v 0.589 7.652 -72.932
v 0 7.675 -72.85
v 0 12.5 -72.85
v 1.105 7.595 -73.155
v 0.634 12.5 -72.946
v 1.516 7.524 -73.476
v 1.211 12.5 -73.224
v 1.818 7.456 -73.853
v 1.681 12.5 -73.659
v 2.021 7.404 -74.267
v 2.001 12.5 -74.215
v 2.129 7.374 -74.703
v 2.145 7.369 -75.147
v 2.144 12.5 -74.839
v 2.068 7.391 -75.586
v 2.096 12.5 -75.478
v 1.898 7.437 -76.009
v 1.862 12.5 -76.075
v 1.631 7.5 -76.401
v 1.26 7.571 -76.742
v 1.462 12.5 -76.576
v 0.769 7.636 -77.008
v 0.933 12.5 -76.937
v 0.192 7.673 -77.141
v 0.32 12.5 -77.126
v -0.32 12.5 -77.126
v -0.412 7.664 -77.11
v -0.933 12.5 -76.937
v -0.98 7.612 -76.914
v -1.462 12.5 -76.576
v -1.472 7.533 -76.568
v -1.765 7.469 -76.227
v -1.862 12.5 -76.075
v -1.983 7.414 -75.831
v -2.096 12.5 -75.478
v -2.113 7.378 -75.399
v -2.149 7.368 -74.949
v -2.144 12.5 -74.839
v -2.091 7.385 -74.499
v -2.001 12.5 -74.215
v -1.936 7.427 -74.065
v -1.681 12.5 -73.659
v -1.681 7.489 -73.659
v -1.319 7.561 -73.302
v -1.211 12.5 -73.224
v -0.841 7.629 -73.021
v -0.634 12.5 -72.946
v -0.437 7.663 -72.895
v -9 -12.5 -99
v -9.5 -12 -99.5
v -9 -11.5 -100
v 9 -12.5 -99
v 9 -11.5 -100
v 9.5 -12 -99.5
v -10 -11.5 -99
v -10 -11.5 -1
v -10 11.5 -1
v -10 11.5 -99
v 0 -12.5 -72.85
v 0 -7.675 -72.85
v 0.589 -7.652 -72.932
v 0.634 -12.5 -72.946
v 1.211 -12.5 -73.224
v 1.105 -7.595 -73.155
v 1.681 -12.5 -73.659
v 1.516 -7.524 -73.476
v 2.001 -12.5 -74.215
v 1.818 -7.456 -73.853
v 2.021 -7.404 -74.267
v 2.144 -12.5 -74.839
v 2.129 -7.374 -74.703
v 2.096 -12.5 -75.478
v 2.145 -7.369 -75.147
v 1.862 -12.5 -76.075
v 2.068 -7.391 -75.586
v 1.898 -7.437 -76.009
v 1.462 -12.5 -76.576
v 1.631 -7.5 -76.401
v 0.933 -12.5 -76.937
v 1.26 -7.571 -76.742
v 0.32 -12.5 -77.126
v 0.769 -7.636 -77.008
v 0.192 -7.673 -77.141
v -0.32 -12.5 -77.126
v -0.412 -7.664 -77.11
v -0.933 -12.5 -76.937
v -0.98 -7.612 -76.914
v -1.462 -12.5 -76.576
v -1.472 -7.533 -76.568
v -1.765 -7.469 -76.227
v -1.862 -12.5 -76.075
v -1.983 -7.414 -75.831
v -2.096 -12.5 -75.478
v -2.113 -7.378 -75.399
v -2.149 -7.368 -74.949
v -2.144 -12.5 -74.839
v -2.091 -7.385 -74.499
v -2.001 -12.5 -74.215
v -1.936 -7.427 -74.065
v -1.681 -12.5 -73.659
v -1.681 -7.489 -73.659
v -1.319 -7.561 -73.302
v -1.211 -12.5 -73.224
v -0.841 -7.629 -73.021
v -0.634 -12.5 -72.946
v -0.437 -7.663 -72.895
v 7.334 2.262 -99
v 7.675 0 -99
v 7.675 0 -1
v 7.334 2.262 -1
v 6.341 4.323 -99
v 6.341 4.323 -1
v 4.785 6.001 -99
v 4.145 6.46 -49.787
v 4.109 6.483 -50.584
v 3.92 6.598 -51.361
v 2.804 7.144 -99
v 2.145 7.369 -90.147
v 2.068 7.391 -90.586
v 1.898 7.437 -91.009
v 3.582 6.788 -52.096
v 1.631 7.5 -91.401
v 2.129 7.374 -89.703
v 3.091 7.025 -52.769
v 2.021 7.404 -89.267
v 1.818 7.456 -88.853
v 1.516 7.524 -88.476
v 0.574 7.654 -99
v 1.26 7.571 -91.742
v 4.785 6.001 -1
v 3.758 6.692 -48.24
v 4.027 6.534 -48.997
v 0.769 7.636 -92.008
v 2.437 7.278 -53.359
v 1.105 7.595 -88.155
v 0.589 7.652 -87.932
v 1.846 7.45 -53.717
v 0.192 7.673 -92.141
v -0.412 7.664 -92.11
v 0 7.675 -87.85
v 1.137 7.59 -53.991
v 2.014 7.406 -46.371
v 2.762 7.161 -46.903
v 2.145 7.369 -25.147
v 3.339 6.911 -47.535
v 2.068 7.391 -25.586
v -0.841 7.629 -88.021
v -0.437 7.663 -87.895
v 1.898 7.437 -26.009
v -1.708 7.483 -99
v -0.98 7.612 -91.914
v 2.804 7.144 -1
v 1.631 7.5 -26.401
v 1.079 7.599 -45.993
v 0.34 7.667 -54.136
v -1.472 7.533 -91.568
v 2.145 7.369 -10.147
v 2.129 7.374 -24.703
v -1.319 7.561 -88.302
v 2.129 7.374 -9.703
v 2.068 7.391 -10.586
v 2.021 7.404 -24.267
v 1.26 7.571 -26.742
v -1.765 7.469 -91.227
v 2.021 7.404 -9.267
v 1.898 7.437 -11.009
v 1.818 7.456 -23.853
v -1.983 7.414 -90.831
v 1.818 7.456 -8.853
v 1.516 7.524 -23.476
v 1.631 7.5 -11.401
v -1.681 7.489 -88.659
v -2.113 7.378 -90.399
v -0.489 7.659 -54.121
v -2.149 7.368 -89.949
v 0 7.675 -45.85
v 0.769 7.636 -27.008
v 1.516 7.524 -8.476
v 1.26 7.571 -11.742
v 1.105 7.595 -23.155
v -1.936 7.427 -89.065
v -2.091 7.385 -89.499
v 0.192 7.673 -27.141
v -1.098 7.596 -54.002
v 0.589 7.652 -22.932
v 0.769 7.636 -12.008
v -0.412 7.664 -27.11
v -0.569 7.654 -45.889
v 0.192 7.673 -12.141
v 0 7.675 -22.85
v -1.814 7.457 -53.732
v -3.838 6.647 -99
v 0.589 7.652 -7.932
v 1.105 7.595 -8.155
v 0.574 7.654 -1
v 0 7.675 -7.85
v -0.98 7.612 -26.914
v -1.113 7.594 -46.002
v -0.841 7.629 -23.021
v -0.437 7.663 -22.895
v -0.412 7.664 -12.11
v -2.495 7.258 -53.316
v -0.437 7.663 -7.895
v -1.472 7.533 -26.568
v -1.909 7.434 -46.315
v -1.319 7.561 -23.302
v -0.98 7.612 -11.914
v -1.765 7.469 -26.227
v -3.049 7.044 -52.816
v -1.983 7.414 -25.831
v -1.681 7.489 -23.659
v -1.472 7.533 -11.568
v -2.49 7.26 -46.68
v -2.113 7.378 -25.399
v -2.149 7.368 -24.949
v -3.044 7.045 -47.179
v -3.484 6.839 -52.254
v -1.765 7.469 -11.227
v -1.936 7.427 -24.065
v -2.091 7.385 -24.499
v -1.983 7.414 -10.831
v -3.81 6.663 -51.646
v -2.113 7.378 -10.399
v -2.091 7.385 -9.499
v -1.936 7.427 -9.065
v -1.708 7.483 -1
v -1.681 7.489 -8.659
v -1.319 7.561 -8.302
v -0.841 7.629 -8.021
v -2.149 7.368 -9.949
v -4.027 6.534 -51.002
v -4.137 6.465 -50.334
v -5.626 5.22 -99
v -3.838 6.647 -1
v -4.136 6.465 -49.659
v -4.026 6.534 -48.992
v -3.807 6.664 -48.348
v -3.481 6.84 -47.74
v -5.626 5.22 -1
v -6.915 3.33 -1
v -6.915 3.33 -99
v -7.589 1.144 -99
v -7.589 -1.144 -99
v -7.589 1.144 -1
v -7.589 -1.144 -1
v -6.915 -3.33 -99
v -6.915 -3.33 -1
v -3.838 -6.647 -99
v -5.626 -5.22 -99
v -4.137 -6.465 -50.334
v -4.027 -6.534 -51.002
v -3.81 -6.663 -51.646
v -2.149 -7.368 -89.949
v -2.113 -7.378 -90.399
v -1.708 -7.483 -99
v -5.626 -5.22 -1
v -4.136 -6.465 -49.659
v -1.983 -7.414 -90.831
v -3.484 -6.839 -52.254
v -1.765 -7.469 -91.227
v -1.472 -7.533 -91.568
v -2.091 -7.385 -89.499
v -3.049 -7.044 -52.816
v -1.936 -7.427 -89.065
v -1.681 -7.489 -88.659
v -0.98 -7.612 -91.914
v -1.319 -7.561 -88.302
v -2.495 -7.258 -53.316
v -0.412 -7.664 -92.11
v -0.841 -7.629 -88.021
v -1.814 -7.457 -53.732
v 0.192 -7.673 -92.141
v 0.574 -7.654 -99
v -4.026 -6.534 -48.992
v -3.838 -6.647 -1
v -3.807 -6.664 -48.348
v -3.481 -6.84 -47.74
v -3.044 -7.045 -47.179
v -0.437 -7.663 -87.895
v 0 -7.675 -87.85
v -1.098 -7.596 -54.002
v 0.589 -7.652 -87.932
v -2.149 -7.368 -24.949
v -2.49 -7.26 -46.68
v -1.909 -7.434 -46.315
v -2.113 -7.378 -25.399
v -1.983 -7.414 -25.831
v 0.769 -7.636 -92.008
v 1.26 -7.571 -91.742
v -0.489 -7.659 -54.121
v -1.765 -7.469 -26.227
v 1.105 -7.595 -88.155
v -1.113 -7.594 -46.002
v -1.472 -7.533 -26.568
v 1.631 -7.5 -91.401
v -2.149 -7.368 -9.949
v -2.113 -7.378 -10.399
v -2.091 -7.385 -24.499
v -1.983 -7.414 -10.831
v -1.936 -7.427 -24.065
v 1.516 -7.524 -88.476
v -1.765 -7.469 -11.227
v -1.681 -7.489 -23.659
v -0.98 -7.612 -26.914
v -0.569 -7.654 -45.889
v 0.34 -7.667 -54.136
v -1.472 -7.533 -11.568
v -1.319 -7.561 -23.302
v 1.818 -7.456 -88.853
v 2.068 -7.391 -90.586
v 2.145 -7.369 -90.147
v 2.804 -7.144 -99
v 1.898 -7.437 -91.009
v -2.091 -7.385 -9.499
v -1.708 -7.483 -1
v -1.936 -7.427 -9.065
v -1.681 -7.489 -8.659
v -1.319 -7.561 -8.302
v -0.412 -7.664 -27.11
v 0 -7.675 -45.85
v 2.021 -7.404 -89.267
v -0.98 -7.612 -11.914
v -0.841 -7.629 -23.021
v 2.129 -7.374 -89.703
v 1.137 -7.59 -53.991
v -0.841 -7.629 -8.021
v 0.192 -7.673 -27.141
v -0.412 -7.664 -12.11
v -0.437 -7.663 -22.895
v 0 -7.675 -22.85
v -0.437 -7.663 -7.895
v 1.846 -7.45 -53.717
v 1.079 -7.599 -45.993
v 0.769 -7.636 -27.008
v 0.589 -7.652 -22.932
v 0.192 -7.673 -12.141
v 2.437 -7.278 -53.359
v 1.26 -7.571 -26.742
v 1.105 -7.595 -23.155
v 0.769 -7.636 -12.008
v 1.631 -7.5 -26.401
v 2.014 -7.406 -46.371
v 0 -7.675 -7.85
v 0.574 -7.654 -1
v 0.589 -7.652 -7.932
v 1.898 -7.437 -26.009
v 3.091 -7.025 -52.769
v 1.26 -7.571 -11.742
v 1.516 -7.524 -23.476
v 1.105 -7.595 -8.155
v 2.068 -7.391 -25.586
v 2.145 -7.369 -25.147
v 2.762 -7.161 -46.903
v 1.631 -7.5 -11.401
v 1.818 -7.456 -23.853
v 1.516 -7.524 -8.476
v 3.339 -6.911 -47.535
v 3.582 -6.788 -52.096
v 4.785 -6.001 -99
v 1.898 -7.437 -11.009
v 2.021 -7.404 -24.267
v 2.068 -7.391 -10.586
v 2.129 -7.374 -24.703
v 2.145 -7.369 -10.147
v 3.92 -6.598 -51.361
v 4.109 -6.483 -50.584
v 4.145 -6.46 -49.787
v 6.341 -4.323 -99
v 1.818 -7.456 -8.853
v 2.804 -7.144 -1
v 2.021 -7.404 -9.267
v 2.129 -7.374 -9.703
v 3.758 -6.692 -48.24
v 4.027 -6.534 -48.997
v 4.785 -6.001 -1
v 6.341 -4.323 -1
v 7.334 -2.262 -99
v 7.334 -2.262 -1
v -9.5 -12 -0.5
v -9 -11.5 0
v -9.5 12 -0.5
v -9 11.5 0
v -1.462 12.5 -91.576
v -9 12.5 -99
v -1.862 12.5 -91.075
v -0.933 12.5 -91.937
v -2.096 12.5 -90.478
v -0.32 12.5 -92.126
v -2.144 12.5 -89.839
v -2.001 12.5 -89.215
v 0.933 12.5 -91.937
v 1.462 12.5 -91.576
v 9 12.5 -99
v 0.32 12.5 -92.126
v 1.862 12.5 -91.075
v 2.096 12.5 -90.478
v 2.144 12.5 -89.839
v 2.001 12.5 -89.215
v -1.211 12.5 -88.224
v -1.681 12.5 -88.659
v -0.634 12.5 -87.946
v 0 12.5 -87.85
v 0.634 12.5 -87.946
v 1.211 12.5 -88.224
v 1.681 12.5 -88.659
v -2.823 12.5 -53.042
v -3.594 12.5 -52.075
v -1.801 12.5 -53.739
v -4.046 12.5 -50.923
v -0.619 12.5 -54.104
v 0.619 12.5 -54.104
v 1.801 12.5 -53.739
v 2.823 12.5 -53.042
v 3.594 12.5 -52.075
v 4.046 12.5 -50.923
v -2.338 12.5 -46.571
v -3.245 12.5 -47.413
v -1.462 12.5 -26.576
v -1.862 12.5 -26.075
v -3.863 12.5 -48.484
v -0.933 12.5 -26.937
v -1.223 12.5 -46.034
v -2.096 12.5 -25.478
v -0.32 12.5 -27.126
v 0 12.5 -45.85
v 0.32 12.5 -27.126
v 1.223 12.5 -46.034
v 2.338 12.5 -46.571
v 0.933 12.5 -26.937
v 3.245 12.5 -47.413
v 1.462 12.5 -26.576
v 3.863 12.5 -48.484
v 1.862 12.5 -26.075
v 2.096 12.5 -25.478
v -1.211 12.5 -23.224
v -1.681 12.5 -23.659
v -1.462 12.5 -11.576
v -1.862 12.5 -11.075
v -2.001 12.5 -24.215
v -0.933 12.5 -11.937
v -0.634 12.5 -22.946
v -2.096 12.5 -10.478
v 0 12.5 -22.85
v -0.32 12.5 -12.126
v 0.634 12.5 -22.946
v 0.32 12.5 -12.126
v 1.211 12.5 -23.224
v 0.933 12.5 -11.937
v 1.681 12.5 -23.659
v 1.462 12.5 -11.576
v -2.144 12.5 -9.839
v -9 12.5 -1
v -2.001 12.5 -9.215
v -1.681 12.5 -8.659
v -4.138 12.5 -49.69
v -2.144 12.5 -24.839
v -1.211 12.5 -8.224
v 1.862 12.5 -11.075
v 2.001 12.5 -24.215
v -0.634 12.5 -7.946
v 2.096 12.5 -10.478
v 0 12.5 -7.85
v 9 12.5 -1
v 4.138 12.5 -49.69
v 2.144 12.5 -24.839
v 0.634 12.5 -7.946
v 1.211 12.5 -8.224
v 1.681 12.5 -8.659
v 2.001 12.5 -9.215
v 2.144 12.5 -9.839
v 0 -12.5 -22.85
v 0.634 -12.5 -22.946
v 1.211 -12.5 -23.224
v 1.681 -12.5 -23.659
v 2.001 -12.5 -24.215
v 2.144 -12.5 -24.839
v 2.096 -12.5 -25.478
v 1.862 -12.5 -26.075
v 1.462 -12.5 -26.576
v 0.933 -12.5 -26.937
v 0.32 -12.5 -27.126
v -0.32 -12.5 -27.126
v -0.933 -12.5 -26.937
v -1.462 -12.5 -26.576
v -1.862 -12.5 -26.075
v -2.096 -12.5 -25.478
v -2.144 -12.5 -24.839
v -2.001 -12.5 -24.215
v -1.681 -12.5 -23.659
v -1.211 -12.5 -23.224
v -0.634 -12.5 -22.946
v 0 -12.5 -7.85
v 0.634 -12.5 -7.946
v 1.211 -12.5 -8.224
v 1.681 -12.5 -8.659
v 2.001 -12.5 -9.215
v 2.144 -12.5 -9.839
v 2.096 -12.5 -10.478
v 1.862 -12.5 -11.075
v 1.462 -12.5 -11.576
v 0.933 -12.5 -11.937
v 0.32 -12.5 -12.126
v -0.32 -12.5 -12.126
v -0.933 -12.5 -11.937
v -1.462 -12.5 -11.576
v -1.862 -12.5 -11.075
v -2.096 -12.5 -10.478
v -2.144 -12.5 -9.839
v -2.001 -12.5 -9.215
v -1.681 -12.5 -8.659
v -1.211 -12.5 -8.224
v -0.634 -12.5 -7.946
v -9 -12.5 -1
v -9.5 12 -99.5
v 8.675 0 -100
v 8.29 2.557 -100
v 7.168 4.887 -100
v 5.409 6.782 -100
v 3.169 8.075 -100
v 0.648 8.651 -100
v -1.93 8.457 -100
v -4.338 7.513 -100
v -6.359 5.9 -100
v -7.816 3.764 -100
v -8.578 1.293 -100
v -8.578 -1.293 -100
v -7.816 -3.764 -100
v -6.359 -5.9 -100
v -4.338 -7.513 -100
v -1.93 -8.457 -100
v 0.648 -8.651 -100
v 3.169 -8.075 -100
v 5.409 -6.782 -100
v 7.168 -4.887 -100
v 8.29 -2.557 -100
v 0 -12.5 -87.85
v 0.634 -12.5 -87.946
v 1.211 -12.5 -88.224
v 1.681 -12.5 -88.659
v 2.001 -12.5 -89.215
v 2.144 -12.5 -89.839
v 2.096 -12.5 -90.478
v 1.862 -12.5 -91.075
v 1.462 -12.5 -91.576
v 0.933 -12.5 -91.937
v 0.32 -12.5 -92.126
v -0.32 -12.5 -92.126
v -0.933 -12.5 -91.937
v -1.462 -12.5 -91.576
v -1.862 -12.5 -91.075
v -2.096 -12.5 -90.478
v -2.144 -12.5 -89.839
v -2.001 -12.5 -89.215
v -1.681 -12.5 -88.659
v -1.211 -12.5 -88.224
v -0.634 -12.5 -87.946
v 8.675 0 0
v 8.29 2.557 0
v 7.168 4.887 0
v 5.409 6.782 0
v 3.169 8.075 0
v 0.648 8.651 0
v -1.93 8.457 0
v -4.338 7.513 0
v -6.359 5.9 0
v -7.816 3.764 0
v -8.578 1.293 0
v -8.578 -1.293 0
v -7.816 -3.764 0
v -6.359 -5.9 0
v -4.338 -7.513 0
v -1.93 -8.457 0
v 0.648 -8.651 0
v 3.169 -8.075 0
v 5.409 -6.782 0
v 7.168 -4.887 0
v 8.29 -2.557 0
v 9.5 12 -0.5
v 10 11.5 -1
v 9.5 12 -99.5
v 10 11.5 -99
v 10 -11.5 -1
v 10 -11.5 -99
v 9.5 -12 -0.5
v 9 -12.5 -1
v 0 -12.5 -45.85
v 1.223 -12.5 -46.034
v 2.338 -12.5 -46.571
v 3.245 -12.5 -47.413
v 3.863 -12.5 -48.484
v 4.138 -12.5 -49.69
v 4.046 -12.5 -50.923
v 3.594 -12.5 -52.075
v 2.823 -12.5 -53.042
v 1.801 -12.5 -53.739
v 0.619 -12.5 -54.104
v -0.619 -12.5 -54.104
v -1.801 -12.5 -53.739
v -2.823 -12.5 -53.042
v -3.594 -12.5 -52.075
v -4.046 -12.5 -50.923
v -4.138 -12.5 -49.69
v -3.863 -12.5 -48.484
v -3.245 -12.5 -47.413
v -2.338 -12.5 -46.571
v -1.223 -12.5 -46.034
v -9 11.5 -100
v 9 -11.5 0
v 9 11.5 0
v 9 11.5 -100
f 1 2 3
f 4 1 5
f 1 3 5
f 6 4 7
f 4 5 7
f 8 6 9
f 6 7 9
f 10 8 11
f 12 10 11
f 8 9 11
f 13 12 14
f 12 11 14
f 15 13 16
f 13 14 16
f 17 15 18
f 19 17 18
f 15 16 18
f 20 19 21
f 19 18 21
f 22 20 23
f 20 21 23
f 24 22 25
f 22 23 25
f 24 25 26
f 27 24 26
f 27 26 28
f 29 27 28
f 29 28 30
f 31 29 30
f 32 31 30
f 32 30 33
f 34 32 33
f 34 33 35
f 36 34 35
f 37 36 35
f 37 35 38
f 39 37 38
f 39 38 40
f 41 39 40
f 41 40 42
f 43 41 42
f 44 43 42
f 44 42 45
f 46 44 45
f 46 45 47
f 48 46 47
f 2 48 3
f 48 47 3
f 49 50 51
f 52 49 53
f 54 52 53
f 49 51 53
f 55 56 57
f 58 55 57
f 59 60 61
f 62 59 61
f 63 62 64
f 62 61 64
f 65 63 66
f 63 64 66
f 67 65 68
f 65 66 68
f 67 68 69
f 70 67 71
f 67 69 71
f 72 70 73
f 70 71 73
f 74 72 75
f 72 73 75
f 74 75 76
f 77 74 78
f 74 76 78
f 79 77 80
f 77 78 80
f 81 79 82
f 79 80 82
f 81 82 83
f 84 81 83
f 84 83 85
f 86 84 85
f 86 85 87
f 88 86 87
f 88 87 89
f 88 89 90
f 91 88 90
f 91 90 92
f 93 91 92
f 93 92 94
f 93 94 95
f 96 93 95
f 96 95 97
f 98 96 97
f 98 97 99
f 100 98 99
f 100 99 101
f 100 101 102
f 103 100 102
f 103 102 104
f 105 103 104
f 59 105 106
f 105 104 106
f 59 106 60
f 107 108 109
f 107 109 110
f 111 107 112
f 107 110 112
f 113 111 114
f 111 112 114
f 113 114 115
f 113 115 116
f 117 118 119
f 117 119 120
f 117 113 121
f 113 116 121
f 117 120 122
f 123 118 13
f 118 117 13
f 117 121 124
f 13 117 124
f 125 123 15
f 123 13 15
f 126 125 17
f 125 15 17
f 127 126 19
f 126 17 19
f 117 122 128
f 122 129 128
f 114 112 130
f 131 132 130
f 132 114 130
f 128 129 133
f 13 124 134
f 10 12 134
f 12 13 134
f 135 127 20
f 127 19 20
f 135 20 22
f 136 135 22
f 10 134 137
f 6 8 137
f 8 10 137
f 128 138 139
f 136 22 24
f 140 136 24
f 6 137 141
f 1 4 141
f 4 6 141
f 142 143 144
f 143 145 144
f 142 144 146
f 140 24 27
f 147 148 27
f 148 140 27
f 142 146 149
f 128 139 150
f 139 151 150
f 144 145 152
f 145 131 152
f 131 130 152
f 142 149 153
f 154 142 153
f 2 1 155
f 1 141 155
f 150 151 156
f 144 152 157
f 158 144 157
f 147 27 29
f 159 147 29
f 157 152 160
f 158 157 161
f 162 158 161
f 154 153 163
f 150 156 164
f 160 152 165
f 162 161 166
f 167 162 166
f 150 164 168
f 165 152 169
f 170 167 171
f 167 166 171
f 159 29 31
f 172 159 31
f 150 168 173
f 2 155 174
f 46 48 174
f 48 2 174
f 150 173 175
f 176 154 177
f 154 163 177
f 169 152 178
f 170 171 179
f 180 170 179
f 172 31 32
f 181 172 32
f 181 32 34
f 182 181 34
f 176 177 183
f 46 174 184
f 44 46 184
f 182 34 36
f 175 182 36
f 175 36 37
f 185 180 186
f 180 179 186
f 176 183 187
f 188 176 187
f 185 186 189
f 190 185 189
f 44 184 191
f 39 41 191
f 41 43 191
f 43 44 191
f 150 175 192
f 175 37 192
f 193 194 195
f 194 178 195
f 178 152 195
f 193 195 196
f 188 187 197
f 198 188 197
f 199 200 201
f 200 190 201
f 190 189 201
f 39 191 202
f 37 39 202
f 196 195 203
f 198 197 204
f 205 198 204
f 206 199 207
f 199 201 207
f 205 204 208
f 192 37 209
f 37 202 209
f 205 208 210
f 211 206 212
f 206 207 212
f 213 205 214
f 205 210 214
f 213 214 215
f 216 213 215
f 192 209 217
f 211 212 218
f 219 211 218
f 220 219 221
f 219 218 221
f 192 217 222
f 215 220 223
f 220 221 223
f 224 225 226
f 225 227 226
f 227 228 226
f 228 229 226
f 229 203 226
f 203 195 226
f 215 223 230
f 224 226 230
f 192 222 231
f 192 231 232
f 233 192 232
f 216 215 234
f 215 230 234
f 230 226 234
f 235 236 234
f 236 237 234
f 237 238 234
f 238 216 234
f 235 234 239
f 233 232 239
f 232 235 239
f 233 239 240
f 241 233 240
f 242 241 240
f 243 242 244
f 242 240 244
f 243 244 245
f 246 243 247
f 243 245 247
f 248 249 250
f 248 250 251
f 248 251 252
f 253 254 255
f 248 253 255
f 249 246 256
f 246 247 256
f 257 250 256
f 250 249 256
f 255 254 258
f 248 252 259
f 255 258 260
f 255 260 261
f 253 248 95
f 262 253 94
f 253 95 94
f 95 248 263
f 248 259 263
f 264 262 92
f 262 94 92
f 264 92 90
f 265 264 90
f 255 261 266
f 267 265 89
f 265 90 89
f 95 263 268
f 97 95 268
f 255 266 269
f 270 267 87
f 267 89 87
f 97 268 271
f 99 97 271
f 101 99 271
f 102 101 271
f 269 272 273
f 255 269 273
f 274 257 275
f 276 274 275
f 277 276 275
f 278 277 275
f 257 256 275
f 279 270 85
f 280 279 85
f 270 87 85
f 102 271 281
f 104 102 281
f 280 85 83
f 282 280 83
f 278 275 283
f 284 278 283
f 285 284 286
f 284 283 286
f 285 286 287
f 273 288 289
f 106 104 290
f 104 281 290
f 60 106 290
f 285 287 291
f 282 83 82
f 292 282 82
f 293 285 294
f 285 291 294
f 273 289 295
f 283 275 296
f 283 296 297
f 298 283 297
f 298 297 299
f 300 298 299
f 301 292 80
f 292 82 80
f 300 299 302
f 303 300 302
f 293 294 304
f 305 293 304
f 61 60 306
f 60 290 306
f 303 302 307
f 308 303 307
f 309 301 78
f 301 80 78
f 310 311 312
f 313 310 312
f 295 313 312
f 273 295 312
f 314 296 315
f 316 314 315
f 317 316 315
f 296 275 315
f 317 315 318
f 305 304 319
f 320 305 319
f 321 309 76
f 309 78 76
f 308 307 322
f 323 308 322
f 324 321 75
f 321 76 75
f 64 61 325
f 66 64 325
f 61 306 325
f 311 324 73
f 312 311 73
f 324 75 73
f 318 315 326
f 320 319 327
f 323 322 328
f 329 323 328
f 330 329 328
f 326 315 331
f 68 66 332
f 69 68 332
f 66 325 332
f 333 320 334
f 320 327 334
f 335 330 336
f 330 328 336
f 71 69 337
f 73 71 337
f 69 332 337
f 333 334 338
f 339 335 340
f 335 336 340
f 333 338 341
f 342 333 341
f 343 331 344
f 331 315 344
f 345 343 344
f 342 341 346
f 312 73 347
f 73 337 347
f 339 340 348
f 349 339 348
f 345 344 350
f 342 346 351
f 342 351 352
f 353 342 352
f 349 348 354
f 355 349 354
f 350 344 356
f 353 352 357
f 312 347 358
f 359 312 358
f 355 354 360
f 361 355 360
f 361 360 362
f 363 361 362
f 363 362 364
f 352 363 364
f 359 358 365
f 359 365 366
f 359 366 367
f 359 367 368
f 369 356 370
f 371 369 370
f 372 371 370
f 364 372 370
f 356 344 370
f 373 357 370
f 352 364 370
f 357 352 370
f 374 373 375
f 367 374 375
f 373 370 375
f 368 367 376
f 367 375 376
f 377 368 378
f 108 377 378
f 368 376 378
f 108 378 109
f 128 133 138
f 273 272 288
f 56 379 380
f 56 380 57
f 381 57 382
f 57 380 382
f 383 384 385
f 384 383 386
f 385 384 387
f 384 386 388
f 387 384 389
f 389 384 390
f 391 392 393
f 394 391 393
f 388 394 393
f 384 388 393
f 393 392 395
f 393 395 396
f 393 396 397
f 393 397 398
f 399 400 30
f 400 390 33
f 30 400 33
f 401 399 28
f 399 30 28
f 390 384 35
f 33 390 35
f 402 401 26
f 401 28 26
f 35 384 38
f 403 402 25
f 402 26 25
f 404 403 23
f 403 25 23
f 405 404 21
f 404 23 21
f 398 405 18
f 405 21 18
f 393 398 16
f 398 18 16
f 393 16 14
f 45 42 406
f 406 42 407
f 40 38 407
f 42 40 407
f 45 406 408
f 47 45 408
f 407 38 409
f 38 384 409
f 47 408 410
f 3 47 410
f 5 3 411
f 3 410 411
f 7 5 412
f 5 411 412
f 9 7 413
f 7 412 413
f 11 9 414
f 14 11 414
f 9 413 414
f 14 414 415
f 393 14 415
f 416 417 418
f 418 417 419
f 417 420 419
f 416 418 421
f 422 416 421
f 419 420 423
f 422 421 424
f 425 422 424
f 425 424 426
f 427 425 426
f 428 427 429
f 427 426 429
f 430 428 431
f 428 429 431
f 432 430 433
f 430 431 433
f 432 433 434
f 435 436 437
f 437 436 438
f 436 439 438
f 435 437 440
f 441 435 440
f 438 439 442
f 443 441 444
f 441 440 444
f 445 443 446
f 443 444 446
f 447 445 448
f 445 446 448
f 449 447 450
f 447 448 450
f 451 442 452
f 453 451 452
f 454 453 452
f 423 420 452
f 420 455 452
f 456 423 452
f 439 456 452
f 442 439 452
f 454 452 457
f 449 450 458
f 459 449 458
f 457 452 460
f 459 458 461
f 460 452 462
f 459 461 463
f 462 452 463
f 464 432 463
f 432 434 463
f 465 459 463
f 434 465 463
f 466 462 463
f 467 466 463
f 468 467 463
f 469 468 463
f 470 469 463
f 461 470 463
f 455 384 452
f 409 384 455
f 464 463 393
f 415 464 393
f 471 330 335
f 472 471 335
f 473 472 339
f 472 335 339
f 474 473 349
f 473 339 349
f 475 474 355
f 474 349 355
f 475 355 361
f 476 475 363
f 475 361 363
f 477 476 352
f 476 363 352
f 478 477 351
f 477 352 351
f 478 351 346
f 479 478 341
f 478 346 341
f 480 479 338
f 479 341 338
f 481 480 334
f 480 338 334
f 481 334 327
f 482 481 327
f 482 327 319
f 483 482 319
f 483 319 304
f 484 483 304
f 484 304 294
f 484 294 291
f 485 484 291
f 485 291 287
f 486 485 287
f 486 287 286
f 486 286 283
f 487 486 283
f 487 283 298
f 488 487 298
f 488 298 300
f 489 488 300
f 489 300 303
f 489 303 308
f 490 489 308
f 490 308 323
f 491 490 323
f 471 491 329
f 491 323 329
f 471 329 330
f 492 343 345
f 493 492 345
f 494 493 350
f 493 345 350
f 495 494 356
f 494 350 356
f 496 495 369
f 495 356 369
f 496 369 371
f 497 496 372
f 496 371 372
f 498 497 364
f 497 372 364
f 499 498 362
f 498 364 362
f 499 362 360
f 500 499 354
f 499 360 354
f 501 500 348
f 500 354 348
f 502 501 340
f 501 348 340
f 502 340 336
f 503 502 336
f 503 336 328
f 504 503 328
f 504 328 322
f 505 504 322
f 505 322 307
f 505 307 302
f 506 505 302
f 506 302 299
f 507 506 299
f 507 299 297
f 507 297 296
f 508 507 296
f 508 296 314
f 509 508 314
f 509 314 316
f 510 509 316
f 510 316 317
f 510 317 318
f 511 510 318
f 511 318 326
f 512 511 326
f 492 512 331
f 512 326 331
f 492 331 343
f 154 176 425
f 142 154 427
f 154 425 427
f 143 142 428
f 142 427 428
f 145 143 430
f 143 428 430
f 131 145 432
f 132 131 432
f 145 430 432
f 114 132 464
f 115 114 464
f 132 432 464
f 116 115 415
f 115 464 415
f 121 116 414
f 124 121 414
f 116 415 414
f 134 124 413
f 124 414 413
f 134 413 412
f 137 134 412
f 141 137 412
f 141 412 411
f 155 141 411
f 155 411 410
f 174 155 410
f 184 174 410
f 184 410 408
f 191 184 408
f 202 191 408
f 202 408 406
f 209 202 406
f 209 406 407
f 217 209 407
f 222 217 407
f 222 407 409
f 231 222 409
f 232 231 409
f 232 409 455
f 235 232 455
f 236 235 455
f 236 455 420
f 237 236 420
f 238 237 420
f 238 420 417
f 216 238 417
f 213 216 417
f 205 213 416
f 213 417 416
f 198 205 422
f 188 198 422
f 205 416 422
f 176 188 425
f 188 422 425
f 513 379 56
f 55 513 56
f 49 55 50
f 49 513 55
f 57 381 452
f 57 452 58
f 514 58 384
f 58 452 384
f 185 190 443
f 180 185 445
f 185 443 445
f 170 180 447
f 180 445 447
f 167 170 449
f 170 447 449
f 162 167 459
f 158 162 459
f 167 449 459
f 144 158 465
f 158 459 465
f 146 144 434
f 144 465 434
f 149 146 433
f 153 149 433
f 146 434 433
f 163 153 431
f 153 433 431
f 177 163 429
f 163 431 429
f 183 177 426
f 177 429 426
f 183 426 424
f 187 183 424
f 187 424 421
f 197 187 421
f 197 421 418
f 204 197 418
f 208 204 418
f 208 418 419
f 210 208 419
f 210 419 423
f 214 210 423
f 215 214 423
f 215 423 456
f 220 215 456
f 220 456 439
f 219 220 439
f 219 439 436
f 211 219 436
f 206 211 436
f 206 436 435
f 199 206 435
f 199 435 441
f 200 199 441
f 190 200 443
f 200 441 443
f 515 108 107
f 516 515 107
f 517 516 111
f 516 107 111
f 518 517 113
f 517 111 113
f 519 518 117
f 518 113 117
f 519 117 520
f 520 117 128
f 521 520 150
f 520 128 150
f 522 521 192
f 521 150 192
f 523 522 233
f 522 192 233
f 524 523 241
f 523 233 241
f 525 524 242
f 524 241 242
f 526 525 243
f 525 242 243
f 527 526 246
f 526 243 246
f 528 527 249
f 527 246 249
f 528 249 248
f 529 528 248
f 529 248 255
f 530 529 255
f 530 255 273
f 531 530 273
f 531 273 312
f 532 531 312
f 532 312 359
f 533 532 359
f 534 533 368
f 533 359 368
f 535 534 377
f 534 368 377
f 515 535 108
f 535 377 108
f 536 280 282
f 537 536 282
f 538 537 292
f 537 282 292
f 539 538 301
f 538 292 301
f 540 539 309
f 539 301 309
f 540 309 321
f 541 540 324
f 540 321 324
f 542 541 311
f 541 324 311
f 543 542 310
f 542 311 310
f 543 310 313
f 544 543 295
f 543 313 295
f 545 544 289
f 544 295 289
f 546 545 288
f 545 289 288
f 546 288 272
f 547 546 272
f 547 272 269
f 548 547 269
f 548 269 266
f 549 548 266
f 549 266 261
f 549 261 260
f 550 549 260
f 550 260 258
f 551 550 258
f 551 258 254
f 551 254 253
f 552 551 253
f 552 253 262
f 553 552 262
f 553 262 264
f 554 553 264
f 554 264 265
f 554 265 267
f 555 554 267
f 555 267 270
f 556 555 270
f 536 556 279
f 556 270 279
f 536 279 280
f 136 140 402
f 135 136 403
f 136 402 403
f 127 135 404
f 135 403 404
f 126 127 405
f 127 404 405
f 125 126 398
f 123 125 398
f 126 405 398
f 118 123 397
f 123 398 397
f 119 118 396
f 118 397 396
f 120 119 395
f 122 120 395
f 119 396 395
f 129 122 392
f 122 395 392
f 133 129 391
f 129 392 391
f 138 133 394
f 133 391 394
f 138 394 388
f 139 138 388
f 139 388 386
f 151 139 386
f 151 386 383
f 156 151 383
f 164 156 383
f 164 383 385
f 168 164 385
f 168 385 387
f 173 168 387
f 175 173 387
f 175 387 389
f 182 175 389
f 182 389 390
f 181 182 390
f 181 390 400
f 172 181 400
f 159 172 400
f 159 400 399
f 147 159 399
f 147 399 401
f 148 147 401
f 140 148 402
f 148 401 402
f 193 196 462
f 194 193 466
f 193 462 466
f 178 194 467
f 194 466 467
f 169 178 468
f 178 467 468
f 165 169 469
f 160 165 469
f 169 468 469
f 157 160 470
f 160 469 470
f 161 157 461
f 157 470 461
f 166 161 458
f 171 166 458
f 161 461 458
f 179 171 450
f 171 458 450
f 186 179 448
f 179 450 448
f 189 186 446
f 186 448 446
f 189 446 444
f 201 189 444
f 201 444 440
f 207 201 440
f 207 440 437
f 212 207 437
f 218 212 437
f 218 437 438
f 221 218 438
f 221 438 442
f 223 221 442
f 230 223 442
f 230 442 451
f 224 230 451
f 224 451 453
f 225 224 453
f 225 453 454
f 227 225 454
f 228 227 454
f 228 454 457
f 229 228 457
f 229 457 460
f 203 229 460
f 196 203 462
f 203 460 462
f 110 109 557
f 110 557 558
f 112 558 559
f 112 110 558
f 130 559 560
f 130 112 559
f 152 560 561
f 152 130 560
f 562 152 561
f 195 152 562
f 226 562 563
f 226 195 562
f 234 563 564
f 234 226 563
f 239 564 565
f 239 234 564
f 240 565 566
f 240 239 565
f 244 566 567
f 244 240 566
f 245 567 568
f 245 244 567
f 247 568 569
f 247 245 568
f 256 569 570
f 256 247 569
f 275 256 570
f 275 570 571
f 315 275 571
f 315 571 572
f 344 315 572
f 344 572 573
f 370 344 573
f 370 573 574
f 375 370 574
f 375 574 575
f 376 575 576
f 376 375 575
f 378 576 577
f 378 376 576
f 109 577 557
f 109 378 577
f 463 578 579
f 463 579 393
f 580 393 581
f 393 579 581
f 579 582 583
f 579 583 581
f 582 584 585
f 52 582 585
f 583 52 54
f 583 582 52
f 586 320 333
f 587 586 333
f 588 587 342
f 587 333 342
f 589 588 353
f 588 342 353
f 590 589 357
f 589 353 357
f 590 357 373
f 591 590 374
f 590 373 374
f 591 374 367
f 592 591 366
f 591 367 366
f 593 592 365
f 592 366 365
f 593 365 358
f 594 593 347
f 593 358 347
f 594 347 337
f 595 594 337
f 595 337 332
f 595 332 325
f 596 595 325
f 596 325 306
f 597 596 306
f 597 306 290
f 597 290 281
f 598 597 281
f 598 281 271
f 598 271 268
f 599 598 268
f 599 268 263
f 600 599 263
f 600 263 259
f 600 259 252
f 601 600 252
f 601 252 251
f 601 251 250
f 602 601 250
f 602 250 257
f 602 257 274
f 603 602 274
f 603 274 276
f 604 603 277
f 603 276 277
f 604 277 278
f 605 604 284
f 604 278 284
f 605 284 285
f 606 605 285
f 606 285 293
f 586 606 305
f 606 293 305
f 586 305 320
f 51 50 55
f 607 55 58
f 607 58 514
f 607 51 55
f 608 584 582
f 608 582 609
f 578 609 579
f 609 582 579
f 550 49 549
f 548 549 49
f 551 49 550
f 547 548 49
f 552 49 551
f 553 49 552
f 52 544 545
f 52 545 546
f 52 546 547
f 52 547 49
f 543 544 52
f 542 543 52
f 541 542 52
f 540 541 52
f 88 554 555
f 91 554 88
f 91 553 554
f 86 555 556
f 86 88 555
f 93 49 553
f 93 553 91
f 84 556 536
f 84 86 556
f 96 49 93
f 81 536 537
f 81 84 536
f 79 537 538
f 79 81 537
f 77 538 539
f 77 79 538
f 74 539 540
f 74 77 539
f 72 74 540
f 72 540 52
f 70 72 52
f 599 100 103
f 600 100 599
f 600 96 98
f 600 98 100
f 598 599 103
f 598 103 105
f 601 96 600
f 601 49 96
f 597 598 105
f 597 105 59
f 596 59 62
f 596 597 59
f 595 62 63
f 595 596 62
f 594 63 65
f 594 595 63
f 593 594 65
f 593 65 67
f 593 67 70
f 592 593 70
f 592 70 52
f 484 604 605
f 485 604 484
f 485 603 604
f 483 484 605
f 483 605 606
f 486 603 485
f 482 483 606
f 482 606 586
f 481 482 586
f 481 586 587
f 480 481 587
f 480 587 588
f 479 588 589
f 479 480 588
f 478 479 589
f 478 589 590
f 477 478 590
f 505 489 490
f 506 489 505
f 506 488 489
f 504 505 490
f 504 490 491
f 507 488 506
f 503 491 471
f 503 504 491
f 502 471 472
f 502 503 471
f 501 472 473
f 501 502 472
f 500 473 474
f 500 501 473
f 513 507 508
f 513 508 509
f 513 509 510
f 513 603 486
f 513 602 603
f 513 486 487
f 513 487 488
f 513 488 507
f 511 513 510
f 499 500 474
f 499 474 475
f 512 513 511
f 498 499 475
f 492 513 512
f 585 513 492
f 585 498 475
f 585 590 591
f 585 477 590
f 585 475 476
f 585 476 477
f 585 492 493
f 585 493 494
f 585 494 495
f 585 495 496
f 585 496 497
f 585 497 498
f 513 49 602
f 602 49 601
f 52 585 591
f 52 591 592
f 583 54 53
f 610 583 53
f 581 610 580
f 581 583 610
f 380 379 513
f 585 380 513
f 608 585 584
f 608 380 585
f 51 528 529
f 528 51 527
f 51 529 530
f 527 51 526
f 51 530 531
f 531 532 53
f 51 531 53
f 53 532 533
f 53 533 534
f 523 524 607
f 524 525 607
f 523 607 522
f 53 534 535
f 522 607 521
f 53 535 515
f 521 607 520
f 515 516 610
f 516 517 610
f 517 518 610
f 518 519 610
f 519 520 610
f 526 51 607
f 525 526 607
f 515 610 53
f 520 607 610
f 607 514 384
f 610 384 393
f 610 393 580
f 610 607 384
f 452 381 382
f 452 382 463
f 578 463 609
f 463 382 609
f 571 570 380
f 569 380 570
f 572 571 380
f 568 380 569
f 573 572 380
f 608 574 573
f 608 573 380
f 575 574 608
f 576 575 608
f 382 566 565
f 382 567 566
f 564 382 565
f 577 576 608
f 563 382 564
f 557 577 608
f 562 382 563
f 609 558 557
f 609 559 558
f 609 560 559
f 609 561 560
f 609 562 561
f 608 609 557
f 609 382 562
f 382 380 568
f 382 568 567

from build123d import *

# Parameters (mm, degrees)
SKETCH_2_W          = 20
SKETCH_2_H          = 25
SKETCH_2_R          = 7.675
EXTRUDE_1_DEPTH     = 100
SKETCH_3_R          = 2.15
SKETCH_3_R_2        = 4.15
CUT_EXTRUDE_2_DEPTH = 104.561575886
CHAMFER_1_SIZE      = 1
CHAMFER_2_SIZE      = 1


with BuildPart() as part:
    # 草图2 → 凸台-拉伸1 (new body)
    with BuildSketch(Plane.XY):
        Rectangle(SKETCH_2_W, SKETCH_2_H)
        Circle(SKETCH_2_R, mode=Mode.SUBTRACT)
    extrude(amount=-EXTRUDE_1_DEPTH)

    # 草图3 → 切除-拉伸2 (cut, through all)
    with BuildSketch(Plane(origin=(0, 12.5, 0), x_dir=(1, 0, 0), z_dir=(0, 1, 0))):
        with Locations((0, 75)):
            Circle(SKETCH_3_R)
        with Locations((0, 50)):
            Circle(SKETCH_3_R_2)
        with Locations((0, 90)):
            Circle(SKETCH_3_R)
        with Locations((0, 10)):
            Circle(SKETCH_3_R)
        with Locations((0, 25)):
            Circle(SKETCH_3_R)
    extrude(amount=-CUT_EXTRUDE_2_DEPTH, mode=Mode.SUBTRACT)

    # 倒角1
    chamfer_1_edges = [part.edges().sort_by_distance(p)[0] for p in [
        (0, 12.5, -100),
        (-10, 0, -100),
        (0, -12.5, -100),
        (10, 0, -100),
        (0, -12.5, 0),
        (-10, 0, 0),
        (0, 12.5, 0),
        (10, 0, 0),
        (-7.675, 0, -100),
        (-7.675, 0, 0),
    ]]
    chamfer(chamfer_1_edges, length=CHAMFER_1_SIZE)

    # 倒角2
    chamfer_2_edges = [part.edges().sort_by_distance(p)[0] for p in [
        (10, -12.5, -50),
        (-10, -12.5, -50),
        (10, 12.5, -50),
        (-10, 12.5, -50),
    ]]
    chamfer(chamfer_2_edges, length=CHAMFER_2_SIZE)


solid = part.part
